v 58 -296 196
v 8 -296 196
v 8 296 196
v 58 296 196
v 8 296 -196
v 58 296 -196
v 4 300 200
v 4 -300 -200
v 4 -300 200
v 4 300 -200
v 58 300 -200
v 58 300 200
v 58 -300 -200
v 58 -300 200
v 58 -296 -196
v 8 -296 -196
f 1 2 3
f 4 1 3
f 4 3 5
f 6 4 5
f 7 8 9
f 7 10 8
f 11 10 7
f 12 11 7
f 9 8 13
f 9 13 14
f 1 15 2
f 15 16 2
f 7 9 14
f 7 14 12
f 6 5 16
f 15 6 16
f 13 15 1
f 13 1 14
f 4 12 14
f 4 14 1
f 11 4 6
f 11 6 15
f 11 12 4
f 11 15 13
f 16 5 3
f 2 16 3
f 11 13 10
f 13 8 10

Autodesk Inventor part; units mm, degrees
ref_plane "YZ Plane" through (0, 0, 0) normal (1, 0, 0) x (0, 1, 0)
ref_plane "XZ Plane" through (0, 0, 0) normal (0, 1, 0) x (-1, 0, 0)
ref_plane "XY Plane" through (0, 0, 0) normal (0, 0, 1) x (1, 0, 0)
ref_plane "РабПлоскость1" through (8, 0, 0) normal (1, 0, 0) x (0, 0, -1)
sketch "Эскиз2" plane through (8, 0, 0) normal (1, 0, 0) x (0, 0, -1)
  line L0 (200, 300) -> (-200, 300) projected
  line L1 (200, -300) -> (200, 300) projected
  line L2 (-200, 300) -> (200, 300)
  line L3 (200, 300) -> (200, -300)
  line L4 (200, -300) -> (-200, -300)
  line L5 (-200, -300) -> (-200, 300)
  line L6 (-196, 296) -> (196, 296)
  line L7 (196, 296) -> (196, -296)
  line L8 (196, -296) -> (-196, -296)
  line L9 (-196, -296) -> (-196, 296)
  point P0 (0, 0)
  dimension "d4" = 4
  dimension "d5" = 4
  dimension "d6" = 4
  dimension "d7" = 4
extrude "Выдавливание2" add sketch "Эскиз2" along normal blind 50
sketch "Эскиз3" plane through (8, 0, 0) normal (-1, 0, 0) x (0, 0, 1)
  line L0 (-200, -300) -> (-200, 300) projected
  line L1 (200, 300) -> (200, -300) projected
  line L2 (-200, 300) -> (200, 300)
  line L3 (200, 300) -> (200, -300)
  line L4 (200, -300) -> (-200, -300)
  line L5 (-200, -300) -> (-200, 300)
  point P0 (0, 0)
extrude "Выдавливание3" add sketch "Эскиз3" along normal blind 4
equation "\"d5\" = d4"
equation "\"d6\" = d4"
equation "\"d7\" = d4"
properties part number "Задняя стенка"
